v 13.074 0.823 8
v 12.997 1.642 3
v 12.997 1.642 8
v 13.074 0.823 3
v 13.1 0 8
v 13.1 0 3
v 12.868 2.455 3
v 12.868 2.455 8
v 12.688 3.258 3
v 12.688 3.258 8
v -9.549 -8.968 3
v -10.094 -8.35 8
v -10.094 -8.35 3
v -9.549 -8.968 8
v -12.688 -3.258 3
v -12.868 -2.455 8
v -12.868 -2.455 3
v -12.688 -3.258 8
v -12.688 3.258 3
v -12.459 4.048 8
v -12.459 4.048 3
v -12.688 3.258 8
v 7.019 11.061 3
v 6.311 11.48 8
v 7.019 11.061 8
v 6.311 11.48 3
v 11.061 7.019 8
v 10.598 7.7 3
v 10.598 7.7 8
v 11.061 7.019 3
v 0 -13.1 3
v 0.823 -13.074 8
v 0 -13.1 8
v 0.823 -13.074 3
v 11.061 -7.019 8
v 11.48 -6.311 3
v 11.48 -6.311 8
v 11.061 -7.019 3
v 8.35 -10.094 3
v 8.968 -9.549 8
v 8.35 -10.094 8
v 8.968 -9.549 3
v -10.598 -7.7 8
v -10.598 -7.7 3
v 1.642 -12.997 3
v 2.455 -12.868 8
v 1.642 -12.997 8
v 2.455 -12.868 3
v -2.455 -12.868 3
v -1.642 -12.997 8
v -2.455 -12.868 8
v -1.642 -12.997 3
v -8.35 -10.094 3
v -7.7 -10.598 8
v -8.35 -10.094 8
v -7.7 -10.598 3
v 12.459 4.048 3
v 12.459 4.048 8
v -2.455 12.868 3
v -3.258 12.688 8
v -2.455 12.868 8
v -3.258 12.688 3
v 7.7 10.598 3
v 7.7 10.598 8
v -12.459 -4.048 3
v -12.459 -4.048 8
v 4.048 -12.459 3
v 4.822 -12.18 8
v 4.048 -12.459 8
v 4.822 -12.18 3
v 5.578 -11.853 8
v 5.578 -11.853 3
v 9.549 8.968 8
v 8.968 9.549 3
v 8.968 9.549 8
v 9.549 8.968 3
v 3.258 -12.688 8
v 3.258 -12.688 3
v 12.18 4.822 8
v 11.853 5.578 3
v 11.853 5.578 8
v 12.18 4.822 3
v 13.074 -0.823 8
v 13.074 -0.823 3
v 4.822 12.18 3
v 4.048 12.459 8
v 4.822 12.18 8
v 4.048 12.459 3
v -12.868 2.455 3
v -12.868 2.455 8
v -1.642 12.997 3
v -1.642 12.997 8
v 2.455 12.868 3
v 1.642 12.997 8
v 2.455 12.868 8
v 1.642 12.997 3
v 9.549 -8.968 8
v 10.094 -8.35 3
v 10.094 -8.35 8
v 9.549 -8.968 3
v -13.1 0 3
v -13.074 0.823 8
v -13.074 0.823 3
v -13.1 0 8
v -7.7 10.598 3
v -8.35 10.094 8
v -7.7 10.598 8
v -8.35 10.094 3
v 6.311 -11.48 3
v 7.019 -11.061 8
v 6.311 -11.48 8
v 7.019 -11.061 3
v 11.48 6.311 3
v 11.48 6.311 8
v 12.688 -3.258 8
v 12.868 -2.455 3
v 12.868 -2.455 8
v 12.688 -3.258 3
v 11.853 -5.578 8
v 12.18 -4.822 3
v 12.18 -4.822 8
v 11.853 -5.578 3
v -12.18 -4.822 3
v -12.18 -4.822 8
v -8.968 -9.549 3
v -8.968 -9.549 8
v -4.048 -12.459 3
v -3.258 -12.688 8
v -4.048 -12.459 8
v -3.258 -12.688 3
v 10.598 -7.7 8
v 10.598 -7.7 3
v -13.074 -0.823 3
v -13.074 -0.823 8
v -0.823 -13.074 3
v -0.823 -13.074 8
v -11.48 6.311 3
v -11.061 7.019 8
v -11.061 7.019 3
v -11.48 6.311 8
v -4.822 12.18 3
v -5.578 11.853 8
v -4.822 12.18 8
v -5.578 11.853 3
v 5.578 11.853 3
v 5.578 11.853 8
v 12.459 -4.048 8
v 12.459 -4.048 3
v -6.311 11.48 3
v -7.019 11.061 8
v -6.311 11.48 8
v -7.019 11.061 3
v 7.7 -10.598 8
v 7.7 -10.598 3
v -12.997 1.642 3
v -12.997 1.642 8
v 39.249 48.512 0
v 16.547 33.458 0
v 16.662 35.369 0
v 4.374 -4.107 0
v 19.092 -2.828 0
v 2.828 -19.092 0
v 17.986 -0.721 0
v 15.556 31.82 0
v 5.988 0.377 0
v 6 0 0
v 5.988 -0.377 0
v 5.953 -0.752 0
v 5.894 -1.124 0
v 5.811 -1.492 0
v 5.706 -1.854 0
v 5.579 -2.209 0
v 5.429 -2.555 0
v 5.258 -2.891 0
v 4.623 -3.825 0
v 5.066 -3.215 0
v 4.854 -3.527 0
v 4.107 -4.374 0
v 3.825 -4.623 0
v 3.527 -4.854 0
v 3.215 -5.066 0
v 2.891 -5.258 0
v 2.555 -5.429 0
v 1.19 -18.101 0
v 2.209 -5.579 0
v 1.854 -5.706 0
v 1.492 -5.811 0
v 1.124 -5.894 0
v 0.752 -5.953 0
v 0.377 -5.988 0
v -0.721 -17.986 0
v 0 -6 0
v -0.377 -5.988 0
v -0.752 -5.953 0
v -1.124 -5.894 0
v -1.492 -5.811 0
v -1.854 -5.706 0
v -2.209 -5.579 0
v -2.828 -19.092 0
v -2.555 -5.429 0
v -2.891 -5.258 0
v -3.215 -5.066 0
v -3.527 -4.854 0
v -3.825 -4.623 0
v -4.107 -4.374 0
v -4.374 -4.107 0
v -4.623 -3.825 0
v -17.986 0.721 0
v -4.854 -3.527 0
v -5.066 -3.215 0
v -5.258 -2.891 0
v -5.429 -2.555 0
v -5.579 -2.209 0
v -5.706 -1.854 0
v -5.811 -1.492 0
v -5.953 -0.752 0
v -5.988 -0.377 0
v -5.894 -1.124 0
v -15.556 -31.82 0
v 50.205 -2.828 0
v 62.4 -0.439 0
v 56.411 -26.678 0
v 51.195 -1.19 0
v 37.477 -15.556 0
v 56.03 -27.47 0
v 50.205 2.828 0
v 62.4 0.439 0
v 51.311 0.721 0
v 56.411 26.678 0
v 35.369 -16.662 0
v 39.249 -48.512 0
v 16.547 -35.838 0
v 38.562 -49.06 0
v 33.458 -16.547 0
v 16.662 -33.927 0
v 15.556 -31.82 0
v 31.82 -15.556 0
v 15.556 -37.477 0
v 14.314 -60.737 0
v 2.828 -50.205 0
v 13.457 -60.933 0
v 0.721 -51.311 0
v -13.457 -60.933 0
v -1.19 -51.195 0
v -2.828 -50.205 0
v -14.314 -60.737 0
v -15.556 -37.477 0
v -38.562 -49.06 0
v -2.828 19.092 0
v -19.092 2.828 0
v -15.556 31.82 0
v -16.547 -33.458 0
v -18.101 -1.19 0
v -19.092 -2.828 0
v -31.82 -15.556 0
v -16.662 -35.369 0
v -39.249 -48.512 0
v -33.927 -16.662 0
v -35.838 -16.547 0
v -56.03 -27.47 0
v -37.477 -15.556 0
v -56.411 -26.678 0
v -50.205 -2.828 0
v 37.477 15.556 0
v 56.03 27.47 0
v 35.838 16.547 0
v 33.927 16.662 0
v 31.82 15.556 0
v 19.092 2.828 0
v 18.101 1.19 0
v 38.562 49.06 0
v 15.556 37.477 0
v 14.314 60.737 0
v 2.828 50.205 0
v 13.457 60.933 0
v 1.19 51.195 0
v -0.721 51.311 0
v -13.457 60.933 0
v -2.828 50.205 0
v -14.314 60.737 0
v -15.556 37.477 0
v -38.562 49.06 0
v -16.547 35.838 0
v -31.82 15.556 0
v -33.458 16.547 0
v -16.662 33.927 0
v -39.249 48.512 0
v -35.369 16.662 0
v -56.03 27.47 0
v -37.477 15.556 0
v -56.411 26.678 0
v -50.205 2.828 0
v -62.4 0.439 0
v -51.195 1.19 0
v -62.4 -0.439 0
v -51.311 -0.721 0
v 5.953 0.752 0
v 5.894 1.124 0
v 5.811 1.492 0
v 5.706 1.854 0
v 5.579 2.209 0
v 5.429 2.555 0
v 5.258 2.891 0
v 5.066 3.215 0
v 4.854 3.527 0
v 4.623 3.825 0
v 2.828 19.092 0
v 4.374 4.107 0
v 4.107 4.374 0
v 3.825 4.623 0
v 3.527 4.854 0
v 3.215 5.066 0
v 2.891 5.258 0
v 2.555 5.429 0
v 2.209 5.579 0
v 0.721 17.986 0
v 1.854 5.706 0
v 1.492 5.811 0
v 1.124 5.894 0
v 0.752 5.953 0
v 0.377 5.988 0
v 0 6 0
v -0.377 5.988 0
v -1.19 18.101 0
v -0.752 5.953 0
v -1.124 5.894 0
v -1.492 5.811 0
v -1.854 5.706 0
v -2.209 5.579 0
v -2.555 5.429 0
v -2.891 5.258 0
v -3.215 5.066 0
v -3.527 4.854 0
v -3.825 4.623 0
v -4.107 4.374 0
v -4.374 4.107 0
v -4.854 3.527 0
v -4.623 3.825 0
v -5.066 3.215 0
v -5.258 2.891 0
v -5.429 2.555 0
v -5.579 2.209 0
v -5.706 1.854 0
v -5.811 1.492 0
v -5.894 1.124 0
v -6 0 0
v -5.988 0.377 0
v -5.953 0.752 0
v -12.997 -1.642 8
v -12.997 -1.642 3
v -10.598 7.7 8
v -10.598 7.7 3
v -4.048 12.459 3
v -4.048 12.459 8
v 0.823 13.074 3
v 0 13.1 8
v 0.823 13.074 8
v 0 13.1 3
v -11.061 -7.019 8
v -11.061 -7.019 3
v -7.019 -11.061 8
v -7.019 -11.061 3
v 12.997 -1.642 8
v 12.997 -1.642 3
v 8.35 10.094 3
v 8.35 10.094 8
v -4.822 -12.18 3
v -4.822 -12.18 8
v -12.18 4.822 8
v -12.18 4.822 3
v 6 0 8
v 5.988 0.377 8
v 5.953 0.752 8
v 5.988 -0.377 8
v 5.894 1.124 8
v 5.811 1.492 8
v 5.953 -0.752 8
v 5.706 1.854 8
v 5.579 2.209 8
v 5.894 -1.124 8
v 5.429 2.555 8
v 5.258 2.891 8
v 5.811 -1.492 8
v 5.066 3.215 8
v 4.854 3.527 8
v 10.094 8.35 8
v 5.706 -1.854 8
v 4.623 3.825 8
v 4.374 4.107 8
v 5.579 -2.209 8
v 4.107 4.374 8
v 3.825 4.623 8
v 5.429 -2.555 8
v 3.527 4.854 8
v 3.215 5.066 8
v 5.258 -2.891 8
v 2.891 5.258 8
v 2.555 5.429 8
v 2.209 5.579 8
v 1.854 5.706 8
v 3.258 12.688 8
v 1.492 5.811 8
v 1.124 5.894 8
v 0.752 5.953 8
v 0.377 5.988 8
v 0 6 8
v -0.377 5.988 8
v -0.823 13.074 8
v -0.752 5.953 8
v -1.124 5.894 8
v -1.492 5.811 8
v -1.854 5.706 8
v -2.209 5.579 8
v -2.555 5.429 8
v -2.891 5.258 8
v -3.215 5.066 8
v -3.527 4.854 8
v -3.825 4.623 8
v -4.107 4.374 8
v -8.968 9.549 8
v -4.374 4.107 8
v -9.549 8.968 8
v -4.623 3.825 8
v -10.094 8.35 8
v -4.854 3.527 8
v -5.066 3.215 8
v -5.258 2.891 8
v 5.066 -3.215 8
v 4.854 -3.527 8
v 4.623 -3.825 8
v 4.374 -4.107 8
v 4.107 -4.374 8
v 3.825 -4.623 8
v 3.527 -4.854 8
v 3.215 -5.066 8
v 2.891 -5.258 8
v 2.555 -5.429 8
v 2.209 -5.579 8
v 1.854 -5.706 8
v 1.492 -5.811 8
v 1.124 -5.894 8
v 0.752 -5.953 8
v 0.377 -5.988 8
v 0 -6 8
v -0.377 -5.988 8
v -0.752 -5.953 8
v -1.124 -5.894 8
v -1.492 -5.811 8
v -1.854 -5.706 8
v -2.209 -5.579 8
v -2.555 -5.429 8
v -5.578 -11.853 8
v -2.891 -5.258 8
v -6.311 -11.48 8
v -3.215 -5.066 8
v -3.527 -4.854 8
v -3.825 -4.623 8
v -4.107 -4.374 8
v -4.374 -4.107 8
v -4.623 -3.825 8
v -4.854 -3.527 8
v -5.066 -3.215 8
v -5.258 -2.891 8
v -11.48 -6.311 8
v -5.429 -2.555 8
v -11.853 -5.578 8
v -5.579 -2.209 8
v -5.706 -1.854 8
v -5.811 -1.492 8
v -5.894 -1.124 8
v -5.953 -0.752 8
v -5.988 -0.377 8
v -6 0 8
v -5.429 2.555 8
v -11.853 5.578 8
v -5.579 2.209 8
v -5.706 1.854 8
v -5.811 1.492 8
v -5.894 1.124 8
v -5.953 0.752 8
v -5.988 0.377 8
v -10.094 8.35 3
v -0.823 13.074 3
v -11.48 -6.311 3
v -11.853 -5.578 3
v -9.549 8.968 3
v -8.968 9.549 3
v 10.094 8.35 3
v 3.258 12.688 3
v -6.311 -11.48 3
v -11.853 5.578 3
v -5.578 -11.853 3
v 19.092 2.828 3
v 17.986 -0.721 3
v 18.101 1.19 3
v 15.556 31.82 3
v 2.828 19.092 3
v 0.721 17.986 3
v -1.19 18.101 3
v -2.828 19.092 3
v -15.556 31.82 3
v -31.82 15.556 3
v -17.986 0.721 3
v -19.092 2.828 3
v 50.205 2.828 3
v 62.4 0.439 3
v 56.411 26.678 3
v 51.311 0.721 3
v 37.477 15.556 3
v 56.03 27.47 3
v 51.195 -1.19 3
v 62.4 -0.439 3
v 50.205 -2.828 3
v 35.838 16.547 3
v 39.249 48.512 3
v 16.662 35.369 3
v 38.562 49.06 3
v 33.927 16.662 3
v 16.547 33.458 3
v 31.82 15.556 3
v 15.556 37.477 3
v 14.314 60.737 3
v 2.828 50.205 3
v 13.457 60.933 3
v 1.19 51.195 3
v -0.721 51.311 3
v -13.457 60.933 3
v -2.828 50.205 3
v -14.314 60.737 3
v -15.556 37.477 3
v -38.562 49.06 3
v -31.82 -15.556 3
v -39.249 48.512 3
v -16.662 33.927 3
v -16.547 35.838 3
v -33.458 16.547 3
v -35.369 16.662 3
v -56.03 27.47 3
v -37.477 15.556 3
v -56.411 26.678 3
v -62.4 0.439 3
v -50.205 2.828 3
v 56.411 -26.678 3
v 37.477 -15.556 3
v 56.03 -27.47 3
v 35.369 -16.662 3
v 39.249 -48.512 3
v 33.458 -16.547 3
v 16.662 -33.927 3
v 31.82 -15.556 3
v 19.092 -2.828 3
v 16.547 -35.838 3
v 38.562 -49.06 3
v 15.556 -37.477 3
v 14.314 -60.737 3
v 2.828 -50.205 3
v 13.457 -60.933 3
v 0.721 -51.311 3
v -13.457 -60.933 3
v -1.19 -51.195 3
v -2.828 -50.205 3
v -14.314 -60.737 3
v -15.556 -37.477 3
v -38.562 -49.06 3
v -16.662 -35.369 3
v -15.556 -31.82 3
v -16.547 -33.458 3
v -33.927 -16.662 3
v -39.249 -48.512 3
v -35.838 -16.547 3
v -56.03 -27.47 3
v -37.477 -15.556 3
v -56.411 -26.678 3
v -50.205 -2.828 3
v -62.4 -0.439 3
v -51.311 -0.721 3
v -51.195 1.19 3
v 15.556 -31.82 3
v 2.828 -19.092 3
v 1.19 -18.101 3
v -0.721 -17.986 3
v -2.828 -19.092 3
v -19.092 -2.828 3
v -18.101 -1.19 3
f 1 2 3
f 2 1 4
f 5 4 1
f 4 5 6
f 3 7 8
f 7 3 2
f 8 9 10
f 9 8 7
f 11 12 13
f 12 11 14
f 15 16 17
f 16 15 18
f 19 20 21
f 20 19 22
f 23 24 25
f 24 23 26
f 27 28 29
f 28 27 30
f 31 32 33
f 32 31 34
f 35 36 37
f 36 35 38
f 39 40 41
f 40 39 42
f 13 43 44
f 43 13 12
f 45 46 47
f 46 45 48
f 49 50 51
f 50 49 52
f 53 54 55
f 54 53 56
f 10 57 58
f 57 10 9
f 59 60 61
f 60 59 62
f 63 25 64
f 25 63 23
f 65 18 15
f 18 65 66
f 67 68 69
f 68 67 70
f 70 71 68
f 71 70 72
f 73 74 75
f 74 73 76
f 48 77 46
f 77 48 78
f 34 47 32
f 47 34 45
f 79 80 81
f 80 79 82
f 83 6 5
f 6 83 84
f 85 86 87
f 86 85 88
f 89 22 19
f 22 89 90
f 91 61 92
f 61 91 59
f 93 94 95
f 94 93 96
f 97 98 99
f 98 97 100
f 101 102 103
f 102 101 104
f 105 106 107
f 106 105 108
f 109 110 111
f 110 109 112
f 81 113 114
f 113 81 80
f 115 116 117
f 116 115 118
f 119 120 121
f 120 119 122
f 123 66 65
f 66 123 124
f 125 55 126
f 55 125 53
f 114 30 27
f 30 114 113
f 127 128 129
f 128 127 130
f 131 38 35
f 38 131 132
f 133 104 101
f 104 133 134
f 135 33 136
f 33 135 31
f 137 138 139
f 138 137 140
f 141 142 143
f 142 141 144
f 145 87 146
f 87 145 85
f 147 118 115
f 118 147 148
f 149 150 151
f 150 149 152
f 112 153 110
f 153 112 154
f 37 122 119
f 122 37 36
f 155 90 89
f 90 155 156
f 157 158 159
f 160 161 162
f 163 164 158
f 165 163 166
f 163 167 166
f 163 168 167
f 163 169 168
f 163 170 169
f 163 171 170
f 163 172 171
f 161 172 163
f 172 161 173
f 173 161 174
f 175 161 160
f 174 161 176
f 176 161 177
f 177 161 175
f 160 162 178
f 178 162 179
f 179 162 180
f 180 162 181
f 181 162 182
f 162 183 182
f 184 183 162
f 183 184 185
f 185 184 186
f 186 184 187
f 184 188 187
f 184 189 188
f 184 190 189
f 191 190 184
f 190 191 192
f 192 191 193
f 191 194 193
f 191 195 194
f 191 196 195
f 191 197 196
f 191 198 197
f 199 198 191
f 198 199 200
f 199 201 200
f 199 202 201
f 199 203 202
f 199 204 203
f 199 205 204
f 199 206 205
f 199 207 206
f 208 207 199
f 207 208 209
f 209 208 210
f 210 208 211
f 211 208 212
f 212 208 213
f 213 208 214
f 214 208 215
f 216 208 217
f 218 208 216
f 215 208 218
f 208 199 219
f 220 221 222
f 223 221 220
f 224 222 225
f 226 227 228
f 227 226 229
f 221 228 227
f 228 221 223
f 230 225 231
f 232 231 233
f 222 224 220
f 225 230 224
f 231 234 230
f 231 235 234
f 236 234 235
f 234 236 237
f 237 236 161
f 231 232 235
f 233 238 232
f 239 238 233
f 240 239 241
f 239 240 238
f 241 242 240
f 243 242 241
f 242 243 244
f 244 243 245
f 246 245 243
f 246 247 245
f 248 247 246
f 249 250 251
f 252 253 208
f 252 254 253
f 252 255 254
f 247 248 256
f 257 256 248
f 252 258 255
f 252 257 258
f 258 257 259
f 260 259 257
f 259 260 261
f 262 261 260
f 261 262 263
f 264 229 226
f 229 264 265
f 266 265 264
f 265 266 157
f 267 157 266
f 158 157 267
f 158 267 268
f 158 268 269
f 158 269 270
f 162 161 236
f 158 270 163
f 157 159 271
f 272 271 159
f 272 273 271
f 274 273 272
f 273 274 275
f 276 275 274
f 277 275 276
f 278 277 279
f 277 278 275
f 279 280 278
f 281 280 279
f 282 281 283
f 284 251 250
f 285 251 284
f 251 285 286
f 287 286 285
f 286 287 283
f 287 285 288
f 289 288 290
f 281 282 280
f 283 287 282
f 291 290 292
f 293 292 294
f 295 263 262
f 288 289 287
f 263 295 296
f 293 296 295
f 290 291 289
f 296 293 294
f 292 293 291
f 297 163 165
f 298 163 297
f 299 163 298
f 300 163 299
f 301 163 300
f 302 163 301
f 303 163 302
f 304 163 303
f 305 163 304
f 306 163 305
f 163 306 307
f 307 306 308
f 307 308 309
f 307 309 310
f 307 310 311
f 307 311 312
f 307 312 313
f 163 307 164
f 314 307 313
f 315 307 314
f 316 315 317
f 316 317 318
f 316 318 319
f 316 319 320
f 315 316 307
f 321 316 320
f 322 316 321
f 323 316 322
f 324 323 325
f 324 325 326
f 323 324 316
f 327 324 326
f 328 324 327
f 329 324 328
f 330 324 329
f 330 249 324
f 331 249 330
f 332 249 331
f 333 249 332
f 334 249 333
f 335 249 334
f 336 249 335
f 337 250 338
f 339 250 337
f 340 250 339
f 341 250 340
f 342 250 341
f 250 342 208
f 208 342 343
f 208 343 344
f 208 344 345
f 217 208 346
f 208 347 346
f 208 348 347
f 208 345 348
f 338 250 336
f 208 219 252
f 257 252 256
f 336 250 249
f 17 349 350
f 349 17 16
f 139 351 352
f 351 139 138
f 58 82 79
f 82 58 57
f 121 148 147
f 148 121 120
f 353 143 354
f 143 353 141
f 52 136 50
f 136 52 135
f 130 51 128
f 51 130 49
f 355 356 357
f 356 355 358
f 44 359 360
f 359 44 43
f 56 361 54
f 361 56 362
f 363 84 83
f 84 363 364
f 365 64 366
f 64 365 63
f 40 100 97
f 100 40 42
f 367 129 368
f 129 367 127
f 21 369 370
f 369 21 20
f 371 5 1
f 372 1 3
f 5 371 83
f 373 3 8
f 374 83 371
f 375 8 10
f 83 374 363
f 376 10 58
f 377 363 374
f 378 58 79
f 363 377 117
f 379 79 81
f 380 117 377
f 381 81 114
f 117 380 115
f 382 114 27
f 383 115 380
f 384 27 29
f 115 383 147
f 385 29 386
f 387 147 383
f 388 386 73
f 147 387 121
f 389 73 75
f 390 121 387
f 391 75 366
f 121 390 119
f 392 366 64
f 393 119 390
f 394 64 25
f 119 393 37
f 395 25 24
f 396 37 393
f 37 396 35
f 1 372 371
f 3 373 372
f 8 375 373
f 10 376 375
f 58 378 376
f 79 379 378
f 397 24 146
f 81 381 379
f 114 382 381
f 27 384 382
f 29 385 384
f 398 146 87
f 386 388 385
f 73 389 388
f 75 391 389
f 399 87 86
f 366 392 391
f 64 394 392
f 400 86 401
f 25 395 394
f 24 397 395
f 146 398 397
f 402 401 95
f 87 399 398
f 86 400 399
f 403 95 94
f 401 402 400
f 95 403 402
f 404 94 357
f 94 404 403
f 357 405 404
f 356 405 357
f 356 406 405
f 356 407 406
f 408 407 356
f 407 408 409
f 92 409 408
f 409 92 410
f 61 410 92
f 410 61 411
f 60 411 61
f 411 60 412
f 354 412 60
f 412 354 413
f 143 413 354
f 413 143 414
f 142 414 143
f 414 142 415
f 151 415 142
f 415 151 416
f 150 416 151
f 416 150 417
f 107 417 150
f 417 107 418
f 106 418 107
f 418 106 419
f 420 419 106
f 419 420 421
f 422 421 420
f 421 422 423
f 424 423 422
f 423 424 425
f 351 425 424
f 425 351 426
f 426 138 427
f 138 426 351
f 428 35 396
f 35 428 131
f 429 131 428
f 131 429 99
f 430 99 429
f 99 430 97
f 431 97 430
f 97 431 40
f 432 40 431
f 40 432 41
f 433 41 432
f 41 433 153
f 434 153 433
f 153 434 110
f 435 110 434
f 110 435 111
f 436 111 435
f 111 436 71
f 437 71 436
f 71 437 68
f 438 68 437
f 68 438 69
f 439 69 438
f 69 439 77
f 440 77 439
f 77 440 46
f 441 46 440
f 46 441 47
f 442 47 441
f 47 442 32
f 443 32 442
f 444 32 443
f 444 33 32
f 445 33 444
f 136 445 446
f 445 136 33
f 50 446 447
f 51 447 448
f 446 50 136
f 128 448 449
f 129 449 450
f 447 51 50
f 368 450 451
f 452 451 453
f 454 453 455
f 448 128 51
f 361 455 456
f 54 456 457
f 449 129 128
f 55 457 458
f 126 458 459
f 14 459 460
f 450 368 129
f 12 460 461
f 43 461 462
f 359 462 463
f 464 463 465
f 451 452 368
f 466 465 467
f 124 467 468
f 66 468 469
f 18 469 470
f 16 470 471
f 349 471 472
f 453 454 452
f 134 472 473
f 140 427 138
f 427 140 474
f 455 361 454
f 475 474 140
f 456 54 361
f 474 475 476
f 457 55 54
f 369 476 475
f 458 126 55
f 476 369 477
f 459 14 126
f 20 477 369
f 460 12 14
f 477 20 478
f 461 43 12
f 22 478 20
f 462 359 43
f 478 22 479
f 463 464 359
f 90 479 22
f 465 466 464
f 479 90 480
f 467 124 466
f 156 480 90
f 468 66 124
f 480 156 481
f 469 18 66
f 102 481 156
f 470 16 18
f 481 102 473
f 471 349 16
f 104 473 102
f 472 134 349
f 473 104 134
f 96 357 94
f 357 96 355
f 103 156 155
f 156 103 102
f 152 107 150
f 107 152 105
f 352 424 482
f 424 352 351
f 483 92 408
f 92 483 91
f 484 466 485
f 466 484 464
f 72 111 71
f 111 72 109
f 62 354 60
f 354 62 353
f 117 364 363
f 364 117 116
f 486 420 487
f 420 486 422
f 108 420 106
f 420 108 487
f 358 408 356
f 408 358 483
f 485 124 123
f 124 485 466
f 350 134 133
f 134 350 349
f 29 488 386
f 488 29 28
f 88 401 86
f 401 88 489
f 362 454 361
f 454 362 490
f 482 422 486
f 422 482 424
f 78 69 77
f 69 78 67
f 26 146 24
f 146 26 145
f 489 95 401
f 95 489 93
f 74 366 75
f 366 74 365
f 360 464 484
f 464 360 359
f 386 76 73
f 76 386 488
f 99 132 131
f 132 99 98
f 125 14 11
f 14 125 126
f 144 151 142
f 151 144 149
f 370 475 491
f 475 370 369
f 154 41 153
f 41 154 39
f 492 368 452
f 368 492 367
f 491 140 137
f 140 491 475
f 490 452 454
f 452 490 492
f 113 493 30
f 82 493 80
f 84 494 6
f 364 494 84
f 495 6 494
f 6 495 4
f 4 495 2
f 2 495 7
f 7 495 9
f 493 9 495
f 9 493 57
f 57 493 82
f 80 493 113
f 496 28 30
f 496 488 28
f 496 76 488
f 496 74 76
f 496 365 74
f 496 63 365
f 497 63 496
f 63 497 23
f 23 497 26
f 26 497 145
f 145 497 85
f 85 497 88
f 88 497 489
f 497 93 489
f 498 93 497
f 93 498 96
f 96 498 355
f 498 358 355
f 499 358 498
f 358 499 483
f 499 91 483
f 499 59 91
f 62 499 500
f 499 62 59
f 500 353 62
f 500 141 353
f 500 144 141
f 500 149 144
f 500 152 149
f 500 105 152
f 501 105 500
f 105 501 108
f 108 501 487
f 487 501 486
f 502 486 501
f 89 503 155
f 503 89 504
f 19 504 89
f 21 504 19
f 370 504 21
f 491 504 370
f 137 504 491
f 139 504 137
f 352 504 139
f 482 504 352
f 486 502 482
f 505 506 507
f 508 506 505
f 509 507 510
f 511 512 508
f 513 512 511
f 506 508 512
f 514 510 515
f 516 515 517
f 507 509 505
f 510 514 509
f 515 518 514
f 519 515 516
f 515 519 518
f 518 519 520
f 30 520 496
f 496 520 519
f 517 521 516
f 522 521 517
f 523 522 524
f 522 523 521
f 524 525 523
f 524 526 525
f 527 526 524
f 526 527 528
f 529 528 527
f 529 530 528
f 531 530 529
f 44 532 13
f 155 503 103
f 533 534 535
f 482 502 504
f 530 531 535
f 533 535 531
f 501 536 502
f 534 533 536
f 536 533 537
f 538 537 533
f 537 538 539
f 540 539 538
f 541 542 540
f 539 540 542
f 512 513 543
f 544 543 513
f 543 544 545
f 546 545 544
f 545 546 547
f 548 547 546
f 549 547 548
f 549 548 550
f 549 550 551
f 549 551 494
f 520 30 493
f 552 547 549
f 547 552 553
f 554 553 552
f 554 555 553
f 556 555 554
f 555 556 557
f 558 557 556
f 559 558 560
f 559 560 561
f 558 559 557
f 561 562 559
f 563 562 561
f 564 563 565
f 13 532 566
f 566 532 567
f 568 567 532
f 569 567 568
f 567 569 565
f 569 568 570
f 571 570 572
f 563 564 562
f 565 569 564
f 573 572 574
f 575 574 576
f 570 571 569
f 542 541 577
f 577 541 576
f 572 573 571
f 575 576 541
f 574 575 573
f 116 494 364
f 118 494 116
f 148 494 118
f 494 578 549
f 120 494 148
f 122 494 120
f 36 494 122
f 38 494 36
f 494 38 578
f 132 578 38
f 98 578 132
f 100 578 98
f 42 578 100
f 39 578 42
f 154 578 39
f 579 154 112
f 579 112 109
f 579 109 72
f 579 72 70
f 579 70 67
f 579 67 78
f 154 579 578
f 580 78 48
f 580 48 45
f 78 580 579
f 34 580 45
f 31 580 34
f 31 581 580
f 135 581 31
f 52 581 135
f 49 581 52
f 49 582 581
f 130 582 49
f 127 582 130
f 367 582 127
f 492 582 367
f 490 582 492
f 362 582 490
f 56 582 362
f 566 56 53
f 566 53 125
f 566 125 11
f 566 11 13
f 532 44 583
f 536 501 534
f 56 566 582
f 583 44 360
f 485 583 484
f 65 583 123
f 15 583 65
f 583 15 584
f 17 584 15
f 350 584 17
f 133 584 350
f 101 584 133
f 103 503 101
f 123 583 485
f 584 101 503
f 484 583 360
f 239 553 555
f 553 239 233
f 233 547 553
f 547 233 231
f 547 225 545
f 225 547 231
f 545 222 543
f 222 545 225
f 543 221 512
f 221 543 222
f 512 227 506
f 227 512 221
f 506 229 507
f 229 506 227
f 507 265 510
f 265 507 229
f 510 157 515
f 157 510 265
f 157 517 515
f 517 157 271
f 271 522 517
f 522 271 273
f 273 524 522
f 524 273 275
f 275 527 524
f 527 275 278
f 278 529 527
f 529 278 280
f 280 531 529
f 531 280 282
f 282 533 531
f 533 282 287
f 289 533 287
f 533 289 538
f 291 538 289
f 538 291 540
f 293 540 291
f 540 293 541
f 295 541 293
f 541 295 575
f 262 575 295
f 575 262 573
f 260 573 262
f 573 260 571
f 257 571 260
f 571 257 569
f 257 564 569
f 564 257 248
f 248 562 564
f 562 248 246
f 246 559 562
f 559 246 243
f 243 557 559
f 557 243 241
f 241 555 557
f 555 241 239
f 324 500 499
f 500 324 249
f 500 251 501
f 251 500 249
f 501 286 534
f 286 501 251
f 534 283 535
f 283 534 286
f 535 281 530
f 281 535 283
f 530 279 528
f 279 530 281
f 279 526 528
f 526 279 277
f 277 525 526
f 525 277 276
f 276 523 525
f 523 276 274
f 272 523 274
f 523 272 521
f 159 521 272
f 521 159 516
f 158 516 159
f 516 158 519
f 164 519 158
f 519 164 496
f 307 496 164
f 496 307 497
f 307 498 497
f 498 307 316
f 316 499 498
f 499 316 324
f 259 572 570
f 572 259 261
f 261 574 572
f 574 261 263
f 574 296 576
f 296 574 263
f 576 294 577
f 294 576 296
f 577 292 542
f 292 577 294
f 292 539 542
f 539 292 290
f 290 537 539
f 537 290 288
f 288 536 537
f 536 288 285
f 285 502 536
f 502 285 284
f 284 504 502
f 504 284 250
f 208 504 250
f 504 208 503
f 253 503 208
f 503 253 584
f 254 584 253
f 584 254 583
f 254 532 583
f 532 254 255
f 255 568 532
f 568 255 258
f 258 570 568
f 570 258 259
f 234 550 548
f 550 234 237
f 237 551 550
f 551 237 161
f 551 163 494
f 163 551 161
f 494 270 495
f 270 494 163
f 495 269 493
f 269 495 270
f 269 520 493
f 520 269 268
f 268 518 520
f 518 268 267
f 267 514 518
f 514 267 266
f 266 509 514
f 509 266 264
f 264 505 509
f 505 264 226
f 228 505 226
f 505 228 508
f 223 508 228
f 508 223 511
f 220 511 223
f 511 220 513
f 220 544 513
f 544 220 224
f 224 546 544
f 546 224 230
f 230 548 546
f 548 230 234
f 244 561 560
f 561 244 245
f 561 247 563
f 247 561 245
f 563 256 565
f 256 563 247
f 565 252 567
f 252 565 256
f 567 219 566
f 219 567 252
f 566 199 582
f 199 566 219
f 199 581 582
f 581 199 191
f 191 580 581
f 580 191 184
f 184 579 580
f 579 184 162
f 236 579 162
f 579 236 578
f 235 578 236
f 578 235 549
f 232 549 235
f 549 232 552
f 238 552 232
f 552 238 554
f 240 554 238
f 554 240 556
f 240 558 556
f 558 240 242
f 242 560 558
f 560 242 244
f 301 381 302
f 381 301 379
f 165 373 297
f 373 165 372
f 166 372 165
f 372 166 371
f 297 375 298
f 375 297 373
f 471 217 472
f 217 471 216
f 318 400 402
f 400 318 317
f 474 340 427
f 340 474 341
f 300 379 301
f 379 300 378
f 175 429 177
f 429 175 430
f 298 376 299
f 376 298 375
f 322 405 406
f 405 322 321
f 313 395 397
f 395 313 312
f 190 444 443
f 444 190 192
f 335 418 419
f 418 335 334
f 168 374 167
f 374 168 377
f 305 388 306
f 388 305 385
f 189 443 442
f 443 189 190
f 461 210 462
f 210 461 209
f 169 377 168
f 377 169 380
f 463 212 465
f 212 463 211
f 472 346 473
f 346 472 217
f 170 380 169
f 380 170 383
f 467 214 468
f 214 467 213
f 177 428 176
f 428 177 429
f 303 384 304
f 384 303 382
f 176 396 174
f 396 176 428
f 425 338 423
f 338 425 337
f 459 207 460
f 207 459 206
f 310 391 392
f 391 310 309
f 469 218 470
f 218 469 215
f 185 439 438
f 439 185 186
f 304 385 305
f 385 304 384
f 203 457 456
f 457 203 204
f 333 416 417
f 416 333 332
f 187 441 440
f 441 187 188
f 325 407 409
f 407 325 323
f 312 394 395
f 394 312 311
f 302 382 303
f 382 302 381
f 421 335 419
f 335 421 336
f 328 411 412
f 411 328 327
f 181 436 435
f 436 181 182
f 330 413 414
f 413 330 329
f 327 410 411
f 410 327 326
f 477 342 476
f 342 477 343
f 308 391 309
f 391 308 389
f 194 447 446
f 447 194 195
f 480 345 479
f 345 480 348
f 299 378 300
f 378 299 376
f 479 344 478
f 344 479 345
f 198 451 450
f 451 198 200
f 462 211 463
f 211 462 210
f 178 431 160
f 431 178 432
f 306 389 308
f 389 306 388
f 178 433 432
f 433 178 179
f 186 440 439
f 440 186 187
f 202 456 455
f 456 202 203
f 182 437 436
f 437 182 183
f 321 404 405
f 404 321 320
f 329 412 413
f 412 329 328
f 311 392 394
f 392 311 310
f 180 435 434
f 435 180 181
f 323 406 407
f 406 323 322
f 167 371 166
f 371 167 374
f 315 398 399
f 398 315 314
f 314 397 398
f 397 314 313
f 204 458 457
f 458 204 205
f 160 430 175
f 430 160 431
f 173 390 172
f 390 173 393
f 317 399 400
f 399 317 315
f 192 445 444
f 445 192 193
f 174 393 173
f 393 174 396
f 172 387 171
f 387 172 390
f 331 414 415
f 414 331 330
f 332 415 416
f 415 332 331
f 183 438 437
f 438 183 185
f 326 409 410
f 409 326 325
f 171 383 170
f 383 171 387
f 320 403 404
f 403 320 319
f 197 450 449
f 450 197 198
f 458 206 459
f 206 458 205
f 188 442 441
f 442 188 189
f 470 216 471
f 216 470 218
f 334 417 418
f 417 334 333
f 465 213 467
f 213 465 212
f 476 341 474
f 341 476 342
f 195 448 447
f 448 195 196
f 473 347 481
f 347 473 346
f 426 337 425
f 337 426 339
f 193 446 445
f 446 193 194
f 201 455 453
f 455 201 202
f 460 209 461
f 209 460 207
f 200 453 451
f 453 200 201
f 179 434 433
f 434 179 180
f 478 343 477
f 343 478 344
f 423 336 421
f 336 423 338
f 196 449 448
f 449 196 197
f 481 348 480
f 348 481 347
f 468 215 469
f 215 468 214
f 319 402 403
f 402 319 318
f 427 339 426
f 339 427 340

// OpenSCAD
use <Round-Anything-master/roundAnythingExamples.scad>

module hub() {
    cylinder(h=8,d=26.2,$fn=100);
    cylinder(h=3,d=35);
}

module axle() {
    translate([0,0,-1])
      cylinder(h=10, d=12, $fn=100);
}


module rim() {
hub();
linear_extrude(3)
    shell2d(0,-4) {
      circle(d=125, $fn=14);
        
      gridpattern(memberW = 23, //wall thick
                    sqW = 26,   //size hole
                    iter = 2,  //hole count
                    r = 3);  //corner radius
    }
}

//Main section of code
difference() {
rim();
axle();
}
